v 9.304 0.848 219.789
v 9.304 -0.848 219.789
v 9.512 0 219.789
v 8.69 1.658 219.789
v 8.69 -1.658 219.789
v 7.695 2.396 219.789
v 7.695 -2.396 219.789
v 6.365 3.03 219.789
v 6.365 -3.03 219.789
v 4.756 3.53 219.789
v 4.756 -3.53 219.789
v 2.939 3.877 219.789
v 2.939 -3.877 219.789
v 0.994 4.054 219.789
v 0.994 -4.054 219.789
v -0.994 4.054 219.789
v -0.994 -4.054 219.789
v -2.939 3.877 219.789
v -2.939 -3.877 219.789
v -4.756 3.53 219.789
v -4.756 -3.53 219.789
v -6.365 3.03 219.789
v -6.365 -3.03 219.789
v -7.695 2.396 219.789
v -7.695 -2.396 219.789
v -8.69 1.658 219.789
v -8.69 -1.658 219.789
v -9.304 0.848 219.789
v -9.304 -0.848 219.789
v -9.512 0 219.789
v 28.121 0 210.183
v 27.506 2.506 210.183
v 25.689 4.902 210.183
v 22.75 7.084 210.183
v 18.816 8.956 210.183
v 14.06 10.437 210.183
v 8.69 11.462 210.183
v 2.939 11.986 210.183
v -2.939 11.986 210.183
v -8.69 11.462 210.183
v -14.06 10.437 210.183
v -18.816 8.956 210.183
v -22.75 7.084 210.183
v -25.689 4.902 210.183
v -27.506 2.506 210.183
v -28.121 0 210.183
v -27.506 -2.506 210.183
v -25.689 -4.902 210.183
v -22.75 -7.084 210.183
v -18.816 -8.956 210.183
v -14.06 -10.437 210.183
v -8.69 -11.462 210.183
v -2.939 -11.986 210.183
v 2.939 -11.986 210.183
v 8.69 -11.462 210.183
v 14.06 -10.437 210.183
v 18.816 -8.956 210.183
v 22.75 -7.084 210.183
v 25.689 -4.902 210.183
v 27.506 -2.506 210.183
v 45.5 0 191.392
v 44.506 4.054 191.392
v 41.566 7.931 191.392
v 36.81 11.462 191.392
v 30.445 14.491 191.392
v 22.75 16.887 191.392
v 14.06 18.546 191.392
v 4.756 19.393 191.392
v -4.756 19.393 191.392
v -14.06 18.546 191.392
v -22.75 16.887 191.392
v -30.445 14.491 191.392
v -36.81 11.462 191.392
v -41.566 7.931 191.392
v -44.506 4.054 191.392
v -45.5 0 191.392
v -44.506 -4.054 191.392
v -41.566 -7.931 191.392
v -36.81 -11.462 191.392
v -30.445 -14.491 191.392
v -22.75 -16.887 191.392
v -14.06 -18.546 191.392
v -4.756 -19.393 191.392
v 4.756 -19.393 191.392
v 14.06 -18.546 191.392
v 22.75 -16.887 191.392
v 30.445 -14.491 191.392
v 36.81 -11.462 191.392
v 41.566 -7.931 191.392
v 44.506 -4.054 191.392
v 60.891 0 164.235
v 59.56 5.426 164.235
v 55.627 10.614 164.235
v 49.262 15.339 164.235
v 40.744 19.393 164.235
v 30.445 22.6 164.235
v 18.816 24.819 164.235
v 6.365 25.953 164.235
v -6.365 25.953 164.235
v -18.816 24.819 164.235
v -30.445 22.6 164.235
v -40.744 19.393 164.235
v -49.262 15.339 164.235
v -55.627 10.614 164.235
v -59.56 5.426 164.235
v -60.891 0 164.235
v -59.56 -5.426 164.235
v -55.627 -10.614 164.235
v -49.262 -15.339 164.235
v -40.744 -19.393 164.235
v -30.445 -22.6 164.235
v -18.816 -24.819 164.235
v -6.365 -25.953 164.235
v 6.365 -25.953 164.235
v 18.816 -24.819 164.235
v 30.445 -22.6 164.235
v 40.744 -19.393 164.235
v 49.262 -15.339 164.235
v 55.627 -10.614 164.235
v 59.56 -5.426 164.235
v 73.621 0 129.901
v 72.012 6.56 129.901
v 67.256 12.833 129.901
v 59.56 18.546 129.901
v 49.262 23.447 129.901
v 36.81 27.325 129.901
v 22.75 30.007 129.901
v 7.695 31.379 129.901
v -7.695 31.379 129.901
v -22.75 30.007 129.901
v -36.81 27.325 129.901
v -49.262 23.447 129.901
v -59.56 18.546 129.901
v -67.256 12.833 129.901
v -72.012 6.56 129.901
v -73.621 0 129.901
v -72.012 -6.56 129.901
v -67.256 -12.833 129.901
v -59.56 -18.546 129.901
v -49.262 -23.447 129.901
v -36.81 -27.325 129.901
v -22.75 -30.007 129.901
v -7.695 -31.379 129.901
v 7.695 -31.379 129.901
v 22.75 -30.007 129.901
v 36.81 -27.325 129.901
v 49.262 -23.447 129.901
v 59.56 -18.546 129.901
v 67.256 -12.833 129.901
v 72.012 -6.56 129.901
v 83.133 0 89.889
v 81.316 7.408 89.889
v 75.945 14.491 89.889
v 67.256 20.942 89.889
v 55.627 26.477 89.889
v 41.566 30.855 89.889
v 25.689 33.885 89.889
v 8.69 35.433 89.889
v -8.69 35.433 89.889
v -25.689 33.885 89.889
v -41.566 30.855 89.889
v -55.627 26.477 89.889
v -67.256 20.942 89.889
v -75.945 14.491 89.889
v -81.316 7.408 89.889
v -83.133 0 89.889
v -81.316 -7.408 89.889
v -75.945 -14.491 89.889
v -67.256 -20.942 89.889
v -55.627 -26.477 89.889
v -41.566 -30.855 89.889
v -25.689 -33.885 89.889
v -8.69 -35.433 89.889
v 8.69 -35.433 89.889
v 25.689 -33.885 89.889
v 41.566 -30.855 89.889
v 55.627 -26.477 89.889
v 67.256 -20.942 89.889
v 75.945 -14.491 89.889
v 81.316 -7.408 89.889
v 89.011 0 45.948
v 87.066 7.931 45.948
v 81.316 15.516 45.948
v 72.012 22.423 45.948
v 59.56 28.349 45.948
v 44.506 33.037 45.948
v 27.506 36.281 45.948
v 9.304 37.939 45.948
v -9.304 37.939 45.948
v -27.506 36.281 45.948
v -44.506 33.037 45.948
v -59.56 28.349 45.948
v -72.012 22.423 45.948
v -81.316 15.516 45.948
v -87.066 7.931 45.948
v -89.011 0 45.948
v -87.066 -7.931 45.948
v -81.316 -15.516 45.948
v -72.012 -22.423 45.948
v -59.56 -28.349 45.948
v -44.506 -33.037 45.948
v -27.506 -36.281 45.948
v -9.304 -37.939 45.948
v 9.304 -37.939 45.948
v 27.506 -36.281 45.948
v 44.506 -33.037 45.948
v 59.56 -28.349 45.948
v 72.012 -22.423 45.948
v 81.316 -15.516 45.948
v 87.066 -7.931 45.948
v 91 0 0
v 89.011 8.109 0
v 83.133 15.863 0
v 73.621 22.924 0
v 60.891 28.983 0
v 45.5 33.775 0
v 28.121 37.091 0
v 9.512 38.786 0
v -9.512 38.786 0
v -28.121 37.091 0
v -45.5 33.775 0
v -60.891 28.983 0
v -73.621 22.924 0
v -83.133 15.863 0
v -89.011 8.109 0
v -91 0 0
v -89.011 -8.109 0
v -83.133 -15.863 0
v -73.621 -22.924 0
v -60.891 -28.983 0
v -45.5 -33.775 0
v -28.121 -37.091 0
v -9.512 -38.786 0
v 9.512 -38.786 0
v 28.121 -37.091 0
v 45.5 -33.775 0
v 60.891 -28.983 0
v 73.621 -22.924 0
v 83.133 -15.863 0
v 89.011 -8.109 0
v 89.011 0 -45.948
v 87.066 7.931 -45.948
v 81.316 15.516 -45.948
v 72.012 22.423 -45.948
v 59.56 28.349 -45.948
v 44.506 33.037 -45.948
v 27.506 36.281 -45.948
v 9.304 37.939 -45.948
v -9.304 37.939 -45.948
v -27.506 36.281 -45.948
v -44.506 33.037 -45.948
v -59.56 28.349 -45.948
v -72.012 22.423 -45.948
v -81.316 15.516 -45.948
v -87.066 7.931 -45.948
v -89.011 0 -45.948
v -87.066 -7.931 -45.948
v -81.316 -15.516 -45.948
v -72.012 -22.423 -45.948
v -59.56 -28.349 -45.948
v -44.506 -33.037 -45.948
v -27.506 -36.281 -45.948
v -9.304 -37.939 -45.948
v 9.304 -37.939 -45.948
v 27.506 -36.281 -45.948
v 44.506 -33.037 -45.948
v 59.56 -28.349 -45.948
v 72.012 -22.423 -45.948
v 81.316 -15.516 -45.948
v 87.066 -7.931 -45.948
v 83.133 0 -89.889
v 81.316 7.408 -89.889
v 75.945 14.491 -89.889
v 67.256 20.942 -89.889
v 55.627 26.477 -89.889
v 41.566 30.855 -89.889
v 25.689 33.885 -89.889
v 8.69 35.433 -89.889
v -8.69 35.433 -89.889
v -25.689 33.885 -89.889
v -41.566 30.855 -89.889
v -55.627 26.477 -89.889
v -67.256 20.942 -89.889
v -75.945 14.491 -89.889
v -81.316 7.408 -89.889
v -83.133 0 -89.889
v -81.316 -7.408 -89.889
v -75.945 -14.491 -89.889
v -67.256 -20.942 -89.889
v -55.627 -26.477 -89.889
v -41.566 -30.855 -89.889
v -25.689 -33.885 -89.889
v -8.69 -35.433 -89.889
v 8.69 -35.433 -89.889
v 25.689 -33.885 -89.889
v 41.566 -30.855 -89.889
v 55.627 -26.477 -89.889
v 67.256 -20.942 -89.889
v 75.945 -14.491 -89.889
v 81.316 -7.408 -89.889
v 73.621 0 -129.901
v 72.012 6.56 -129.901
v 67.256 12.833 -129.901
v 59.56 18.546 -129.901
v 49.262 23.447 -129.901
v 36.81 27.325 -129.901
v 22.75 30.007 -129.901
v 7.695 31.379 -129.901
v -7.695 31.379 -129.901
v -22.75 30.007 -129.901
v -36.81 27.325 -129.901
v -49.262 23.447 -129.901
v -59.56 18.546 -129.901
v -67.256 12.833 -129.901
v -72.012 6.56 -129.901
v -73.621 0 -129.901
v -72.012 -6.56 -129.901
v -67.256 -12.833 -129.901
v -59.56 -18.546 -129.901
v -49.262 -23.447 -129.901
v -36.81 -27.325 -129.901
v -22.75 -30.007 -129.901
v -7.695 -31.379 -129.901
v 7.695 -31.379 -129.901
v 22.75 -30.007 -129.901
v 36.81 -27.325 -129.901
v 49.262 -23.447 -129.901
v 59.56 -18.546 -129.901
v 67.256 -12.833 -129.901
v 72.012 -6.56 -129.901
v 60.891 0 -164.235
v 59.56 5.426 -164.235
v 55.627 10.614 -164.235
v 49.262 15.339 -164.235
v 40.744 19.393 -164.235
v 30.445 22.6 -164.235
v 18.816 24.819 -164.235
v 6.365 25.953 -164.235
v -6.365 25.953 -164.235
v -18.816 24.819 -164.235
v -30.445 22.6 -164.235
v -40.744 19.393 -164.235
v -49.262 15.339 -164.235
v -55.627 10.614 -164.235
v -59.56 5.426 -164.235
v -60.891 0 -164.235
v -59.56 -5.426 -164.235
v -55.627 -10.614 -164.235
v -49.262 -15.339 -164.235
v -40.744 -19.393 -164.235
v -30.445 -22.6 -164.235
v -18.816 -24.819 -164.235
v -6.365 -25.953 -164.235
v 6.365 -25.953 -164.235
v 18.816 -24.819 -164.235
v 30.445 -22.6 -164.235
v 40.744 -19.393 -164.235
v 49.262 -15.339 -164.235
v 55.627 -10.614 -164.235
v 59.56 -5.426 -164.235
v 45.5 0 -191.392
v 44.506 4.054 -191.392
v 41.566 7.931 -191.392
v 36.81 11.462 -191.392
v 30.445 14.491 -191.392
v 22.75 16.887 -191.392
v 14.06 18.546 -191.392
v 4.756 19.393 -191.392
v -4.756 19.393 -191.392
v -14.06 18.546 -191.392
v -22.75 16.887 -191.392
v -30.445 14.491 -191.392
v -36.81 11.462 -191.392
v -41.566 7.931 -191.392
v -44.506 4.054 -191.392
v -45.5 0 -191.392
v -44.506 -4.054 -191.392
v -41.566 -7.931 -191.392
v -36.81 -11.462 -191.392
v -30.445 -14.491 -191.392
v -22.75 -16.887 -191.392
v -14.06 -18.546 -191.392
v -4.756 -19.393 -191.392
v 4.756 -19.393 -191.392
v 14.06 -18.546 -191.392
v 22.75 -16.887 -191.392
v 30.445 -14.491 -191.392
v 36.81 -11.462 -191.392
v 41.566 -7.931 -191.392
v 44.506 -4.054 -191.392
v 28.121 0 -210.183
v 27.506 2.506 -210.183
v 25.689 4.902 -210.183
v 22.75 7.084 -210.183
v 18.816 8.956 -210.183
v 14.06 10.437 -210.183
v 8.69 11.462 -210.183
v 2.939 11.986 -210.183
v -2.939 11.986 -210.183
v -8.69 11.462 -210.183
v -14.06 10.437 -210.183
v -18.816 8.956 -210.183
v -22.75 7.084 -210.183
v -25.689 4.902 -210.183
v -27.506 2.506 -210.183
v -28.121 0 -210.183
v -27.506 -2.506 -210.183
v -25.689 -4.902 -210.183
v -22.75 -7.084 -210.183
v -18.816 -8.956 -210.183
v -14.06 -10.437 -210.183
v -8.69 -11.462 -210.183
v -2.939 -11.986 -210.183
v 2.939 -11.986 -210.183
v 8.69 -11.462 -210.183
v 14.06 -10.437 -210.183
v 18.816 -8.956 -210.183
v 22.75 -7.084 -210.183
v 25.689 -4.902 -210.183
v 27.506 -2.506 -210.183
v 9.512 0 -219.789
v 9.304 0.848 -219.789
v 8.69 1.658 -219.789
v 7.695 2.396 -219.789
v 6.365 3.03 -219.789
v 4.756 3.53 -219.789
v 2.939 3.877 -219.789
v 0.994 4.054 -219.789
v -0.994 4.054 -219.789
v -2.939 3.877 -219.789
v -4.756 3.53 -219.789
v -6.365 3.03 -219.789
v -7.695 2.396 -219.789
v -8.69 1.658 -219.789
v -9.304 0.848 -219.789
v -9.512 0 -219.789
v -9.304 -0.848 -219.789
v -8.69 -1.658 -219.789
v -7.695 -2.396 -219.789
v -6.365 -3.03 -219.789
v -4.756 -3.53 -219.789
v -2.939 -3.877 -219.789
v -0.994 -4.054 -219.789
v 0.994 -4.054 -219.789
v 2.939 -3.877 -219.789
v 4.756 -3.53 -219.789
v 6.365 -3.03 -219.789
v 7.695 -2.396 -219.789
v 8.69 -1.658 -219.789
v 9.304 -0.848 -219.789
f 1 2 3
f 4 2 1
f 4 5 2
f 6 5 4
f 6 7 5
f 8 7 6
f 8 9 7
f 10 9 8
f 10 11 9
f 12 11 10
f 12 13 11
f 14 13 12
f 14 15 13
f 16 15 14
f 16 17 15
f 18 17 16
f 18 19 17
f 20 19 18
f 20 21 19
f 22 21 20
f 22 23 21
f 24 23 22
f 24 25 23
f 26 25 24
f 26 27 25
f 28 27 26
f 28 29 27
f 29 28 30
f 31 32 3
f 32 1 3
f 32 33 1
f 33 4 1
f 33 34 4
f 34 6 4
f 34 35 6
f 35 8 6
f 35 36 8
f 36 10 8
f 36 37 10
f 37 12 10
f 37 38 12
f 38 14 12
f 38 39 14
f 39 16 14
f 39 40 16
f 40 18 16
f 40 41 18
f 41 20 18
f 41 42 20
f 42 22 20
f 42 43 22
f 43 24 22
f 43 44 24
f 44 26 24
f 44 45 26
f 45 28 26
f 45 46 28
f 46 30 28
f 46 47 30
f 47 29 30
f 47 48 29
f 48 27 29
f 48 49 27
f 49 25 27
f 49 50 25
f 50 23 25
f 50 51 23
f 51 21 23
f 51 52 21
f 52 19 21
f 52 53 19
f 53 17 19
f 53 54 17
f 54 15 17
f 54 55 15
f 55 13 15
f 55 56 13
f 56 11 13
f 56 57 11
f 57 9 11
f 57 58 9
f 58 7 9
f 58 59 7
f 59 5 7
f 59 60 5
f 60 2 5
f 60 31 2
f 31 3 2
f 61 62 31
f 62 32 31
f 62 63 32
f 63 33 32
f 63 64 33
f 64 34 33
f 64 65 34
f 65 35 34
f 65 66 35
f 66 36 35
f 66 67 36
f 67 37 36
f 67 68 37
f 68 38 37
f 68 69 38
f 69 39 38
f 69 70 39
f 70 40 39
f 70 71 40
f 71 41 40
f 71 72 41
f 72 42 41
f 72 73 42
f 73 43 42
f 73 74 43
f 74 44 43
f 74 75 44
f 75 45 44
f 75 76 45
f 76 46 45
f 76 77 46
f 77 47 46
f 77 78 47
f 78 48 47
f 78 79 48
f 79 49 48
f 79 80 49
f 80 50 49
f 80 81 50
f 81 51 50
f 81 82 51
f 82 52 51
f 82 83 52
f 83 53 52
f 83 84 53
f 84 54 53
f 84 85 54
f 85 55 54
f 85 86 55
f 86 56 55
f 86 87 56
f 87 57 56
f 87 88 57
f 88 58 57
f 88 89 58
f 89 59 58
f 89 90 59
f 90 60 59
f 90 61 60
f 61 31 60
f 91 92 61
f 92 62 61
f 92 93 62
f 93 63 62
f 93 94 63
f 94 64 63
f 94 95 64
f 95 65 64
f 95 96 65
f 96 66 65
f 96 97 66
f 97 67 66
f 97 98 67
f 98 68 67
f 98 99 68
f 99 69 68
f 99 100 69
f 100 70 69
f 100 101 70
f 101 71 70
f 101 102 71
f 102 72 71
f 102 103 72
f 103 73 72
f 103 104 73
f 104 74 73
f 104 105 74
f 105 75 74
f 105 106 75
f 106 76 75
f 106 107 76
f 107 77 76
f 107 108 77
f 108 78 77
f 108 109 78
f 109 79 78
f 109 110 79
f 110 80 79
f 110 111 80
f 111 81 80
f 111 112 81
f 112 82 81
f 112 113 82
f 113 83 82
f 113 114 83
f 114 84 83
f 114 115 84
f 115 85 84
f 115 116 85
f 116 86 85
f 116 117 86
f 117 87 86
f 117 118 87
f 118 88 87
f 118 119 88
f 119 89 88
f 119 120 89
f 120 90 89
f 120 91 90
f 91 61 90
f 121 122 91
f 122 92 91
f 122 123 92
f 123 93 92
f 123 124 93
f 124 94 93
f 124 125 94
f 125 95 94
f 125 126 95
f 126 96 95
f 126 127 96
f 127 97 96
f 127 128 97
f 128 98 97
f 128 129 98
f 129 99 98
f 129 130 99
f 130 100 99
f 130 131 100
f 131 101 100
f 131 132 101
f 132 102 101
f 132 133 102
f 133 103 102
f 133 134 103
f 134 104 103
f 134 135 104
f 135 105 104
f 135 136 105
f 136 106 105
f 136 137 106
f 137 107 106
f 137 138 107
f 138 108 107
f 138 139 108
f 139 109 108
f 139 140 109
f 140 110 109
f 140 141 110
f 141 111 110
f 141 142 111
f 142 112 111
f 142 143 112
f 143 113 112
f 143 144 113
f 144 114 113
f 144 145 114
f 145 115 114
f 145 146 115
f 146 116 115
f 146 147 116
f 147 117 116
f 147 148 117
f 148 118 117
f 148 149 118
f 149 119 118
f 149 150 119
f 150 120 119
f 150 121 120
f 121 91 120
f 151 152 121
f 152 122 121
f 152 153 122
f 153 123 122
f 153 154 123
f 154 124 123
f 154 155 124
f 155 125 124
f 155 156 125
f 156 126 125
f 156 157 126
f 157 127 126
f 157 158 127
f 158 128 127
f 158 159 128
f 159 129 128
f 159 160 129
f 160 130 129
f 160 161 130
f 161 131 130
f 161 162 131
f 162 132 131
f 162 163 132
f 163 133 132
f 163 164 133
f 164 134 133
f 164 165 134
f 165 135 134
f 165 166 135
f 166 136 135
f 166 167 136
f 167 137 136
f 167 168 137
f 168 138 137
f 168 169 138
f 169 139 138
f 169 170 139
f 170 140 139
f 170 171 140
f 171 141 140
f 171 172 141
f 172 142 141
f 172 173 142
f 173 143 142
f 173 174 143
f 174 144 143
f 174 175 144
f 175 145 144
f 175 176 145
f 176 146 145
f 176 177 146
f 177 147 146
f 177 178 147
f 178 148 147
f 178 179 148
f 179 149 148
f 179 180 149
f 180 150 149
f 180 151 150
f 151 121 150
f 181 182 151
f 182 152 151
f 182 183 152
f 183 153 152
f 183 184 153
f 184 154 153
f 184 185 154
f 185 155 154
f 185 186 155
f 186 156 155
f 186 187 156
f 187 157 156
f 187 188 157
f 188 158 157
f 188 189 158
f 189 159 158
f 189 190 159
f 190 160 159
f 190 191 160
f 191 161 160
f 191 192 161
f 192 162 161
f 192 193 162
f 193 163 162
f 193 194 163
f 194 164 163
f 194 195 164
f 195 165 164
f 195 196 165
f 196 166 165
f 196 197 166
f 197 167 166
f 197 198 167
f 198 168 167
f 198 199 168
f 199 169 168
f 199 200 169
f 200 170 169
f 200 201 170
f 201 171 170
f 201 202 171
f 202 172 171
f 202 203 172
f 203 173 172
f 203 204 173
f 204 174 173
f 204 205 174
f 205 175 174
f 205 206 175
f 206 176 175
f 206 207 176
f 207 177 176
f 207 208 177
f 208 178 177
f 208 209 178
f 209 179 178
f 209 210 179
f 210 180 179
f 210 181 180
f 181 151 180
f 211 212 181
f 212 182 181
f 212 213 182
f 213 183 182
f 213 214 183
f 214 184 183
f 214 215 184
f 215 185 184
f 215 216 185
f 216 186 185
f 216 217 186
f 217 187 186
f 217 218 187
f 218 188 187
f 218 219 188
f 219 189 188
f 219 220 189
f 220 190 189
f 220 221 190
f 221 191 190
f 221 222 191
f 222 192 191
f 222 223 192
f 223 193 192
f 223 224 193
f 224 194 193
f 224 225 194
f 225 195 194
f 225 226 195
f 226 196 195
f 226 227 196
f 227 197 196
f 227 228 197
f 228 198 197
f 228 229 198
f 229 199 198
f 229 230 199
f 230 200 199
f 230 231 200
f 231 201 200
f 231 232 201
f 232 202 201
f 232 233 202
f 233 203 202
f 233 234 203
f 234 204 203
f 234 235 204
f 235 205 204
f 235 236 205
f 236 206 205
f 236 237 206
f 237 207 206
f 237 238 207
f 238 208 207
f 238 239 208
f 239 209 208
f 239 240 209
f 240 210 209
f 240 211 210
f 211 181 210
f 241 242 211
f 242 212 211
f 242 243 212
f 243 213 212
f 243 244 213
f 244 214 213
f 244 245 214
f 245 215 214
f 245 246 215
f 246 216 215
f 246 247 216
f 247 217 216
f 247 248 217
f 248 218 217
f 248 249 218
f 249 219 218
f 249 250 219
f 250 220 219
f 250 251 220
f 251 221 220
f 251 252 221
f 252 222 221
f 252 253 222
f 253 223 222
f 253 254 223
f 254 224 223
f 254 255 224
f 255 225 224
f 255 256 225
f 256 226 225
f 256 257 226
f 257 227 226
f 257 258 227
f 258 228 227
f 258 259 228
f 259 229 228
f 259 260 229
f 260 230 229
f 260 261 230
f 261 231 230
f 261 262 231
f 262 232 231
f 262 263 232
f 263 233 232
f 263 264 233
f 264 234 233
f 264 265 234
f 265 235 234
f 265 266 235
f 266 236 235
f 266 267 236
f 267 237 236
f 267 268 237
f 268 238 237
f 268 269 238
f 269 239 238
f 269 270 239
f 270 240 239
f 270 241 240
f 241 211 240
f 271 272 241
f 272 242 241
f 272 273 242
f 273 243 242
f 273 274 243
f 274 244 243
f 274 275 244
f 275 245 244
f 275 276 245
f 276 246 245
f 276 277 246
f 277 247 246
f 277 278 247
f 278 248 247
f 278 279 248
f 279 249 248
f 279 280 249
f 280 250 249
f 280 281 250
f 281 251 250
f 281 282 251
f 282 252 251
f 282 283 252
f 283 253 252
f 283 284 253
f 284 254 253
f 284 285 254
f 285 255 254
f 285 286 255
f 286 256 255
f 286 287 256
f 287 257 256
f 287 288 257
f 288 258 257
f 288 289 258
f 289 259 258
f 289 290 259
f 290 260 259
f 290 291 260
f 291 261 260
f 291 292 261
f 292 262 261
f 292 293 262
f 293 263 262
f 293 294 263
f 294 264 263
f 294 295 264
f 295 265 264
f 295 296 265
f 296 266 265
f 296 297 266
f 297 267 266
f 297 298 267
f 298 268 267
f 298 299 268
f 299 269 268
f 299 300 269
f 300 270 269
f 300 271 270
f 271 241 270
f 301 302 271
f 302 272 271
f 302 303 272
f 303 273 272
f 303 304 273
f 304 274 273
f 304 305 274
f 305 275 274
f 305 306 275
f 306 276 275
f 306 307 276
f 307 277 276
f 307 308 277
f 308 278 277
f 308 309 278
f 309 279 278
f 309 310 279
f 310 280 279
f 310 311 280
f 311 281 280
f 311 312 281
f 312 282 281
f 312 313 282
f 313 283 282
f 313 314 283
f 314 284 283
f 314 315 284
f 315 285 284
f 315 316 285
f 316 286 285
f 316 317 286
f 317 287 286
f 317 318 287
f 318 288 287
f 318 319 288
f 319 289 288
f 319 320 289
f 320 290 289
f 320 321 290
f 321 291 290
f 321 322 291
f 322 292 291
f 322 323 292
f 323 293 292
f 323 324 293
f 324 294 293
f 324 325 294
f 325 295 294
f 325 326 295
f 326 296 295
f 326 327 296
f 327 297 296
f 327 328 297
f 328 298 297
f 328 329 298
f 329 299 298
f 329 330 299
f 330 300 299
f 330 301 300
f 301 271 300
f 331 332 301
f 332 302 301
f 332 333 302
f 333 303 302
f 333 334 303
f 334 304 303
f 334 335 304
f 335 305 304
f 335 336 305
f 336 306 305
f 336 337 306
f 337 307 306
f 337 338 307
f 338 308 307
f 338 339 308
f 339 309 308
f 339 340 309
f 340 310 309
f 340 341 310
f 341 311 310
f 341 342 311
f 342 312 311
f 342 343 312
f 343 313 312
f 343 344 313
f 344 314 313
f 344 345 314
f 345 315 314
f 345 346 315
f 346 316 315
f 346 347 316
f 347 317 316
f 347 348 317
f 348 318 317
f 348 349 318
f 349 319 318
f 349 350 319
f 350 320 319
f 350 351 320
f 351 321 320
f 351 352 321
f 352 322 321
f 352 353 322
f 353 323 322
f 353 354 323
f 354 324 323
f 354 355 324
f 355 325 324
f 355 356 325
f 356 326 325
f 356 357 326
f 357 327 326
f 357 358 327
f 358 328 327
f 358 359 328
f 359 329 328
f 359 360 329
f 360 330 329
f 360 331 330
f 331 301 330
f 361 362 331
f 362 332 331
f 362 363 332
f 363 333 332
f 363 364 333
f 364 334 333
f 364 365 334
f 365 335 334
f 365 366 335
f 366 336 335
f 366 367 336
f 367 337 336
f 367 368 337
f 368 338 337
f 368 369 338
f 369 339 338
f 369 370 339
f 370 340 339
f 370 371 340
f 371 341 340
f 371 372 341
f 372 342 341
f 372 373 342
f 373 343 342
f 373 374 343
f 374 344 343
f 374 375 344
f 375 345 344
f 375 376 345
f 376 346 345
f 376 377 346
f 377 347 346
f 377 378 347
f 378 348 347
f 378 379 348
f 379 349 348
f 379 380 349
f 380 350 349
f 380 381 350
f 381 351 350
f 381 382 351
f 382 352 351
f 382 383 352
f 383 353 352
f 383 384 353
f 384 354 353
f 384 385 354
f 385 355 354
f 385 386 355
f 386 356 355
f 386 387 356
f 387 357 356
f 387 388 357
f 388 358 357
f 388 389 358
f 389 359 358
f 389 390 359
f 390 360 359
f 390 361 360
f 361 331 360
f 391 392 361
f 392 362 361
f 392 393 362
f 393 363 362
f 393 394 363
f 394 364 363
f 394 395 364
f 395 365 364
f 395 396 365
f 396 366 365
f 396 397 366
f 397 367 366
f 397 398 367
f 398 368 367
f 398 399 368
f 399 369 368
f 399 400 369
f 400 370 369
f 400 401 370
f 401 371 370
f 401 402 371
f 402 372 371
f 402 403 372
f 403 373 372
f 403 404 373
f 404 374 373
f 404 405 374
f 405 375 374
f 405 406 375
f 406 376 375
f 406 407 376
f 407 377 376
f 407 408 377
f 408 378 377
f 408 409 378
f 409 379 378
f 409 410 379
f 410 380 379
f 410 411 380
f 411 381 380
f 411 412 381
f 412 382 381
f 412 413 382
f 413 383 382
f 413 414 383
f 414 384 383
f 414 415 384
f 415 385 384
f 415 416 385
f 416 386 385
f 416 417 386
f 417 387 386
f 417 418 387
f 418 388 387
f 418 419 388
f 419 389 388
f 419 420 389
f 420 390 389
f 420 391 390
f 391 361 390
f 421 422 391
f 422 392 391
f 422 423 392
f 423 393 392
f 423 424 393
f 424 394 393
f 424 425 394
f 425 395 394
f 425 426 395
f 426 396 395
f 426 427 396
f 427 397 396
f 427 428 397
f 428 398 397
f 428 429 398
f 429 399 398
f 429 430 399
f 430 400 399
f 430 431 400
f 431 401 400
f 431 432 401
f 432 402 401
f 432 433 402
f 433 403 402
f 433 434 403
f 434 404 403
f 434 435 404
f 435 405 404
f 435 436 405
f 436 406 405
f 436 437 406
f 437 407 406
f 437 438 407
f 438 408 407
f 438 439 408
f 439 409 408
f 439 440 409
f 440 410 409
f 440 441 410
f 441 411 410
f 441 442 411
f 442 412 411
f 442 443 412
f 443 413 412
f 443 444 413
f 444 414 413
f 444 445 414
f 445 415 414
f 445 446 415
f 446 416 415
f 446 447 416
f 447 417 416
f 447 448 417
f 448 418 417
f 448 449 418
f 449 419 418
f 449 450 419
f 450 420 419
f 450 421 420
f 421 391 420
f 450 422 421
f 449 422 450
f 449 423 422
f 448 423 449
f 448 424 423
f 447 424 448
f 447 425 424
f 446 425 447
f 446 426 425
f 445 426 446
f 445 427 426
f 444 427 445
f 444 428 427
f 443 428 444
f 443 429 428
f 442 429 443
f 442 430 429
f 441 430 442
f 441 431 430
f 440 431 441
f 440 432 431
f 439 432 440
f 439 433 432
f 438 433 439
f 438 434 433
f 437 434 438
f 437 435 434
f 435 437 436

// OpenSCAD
// Generated by SolidPython 1.0.1 on 2020-07-29 00:46:47


scale(v = [7, 3, 17]) {
	sphere(r = 13);
}
/***********************************************
*********      SolidPython code:      **********
************************************************
 
# import packages: SolidPython
from solid import *
from solid.utils import *
from itertools import chain, combinations, permutations


class Resize:

    def __init__(self, scad_file):
        self.scad_file = scad_file
        #self.scad_file = import_scad(scad_file)
        # cone/cylinder param:
        self.r1 = 0
        self.r2 = 0
        self.h = 0
        # rectangular prism param:
        self.w = 0
        self.l = 0
        # ellipse param:
        self.r = 0

    # import OpenScad code (file name corresponds to shape)


    # classify shape + parameters
    def assign(self, param1, param2, param3):
        if self.scad_file == 'cone.scad':
            self.r1 = param1
            self.r2 = param2
            self.h = param3
        elif self.scad_file == 'cylinder.scad':
            self.r1 = param1
            self.r2 = param2
            self.h = param3
        elif self.scad_file == 'rectangularPrism.scad':
            self.h = param1
            self.l = param2
            self.w = param3
        else:
            self.r = param1
            self.h = param2

    # resize parameters
    def iterate(self):
        x = range(3, 20, 2)
        i = 1
        if self.scad_file == 'cone.scad':
            tempList = list(permutations(x, 2))
            for temp in tempList:
                param1 = temp[0]
                param2 = temp[1]
                filepath = 'produced_scad_files/' + 'cone' + str(param1) + '_' + str(param2) + '_' + '.scad'
                scad_render_to_file(cylinder(h=param1, r1=param2, r2=0), filepath)

        elif self.scad_file == 'cylinder.scad':
            tempList = list(permutations(x, 3))
            for temp in tempList:
                param1 = temp[0]
                param2 = temp[1]
                filepath = 'produced_scad_files/' + 'cylinder' + str(param1) + '_' + str(param2) + '_' + '.scad'
                scad_render_to_file(cylinder(h=param1, r1=param2, r2=param2), filepath)

        elif self.scad_file == 'rectangularPrism.scad':
            tempList = list(permutations(x, 3))
            for temp in tempList:
                param1 = temp[0]
                param2 = temp[1]
                param3 = temp[2]
                filepath = 'produced_scad_files/' + 'rectangularPrism' + str(param1) + '_' + str(param2) + '_' + str(
                    param3) + '.scad'
                scad_render_to_file(cube(size=(param1, param2, param3)), filepath)

        elif self.scad_file == 'ellipse.scad':
            tempList = list(permutations(x, 4))
            for temp in tempList:
                param1 = temp[0]
                param2 = temp[1]
                param3 = temp[2]
                param4 = temp[3]
                filepath = 'produced_scad_files/' + 'ellipse' + str(param1) + '_' + str(param2) + '_' + str(param3) + '_' + str(param4) + '.scad'
                scad_render_to_file(scale([param1, param2, param3])(sphere(r=param4)), filepath)

    def render_to_scadfile(self):
        scad_render_to_file(scad, 'example.scad') 
 
************************************************/
